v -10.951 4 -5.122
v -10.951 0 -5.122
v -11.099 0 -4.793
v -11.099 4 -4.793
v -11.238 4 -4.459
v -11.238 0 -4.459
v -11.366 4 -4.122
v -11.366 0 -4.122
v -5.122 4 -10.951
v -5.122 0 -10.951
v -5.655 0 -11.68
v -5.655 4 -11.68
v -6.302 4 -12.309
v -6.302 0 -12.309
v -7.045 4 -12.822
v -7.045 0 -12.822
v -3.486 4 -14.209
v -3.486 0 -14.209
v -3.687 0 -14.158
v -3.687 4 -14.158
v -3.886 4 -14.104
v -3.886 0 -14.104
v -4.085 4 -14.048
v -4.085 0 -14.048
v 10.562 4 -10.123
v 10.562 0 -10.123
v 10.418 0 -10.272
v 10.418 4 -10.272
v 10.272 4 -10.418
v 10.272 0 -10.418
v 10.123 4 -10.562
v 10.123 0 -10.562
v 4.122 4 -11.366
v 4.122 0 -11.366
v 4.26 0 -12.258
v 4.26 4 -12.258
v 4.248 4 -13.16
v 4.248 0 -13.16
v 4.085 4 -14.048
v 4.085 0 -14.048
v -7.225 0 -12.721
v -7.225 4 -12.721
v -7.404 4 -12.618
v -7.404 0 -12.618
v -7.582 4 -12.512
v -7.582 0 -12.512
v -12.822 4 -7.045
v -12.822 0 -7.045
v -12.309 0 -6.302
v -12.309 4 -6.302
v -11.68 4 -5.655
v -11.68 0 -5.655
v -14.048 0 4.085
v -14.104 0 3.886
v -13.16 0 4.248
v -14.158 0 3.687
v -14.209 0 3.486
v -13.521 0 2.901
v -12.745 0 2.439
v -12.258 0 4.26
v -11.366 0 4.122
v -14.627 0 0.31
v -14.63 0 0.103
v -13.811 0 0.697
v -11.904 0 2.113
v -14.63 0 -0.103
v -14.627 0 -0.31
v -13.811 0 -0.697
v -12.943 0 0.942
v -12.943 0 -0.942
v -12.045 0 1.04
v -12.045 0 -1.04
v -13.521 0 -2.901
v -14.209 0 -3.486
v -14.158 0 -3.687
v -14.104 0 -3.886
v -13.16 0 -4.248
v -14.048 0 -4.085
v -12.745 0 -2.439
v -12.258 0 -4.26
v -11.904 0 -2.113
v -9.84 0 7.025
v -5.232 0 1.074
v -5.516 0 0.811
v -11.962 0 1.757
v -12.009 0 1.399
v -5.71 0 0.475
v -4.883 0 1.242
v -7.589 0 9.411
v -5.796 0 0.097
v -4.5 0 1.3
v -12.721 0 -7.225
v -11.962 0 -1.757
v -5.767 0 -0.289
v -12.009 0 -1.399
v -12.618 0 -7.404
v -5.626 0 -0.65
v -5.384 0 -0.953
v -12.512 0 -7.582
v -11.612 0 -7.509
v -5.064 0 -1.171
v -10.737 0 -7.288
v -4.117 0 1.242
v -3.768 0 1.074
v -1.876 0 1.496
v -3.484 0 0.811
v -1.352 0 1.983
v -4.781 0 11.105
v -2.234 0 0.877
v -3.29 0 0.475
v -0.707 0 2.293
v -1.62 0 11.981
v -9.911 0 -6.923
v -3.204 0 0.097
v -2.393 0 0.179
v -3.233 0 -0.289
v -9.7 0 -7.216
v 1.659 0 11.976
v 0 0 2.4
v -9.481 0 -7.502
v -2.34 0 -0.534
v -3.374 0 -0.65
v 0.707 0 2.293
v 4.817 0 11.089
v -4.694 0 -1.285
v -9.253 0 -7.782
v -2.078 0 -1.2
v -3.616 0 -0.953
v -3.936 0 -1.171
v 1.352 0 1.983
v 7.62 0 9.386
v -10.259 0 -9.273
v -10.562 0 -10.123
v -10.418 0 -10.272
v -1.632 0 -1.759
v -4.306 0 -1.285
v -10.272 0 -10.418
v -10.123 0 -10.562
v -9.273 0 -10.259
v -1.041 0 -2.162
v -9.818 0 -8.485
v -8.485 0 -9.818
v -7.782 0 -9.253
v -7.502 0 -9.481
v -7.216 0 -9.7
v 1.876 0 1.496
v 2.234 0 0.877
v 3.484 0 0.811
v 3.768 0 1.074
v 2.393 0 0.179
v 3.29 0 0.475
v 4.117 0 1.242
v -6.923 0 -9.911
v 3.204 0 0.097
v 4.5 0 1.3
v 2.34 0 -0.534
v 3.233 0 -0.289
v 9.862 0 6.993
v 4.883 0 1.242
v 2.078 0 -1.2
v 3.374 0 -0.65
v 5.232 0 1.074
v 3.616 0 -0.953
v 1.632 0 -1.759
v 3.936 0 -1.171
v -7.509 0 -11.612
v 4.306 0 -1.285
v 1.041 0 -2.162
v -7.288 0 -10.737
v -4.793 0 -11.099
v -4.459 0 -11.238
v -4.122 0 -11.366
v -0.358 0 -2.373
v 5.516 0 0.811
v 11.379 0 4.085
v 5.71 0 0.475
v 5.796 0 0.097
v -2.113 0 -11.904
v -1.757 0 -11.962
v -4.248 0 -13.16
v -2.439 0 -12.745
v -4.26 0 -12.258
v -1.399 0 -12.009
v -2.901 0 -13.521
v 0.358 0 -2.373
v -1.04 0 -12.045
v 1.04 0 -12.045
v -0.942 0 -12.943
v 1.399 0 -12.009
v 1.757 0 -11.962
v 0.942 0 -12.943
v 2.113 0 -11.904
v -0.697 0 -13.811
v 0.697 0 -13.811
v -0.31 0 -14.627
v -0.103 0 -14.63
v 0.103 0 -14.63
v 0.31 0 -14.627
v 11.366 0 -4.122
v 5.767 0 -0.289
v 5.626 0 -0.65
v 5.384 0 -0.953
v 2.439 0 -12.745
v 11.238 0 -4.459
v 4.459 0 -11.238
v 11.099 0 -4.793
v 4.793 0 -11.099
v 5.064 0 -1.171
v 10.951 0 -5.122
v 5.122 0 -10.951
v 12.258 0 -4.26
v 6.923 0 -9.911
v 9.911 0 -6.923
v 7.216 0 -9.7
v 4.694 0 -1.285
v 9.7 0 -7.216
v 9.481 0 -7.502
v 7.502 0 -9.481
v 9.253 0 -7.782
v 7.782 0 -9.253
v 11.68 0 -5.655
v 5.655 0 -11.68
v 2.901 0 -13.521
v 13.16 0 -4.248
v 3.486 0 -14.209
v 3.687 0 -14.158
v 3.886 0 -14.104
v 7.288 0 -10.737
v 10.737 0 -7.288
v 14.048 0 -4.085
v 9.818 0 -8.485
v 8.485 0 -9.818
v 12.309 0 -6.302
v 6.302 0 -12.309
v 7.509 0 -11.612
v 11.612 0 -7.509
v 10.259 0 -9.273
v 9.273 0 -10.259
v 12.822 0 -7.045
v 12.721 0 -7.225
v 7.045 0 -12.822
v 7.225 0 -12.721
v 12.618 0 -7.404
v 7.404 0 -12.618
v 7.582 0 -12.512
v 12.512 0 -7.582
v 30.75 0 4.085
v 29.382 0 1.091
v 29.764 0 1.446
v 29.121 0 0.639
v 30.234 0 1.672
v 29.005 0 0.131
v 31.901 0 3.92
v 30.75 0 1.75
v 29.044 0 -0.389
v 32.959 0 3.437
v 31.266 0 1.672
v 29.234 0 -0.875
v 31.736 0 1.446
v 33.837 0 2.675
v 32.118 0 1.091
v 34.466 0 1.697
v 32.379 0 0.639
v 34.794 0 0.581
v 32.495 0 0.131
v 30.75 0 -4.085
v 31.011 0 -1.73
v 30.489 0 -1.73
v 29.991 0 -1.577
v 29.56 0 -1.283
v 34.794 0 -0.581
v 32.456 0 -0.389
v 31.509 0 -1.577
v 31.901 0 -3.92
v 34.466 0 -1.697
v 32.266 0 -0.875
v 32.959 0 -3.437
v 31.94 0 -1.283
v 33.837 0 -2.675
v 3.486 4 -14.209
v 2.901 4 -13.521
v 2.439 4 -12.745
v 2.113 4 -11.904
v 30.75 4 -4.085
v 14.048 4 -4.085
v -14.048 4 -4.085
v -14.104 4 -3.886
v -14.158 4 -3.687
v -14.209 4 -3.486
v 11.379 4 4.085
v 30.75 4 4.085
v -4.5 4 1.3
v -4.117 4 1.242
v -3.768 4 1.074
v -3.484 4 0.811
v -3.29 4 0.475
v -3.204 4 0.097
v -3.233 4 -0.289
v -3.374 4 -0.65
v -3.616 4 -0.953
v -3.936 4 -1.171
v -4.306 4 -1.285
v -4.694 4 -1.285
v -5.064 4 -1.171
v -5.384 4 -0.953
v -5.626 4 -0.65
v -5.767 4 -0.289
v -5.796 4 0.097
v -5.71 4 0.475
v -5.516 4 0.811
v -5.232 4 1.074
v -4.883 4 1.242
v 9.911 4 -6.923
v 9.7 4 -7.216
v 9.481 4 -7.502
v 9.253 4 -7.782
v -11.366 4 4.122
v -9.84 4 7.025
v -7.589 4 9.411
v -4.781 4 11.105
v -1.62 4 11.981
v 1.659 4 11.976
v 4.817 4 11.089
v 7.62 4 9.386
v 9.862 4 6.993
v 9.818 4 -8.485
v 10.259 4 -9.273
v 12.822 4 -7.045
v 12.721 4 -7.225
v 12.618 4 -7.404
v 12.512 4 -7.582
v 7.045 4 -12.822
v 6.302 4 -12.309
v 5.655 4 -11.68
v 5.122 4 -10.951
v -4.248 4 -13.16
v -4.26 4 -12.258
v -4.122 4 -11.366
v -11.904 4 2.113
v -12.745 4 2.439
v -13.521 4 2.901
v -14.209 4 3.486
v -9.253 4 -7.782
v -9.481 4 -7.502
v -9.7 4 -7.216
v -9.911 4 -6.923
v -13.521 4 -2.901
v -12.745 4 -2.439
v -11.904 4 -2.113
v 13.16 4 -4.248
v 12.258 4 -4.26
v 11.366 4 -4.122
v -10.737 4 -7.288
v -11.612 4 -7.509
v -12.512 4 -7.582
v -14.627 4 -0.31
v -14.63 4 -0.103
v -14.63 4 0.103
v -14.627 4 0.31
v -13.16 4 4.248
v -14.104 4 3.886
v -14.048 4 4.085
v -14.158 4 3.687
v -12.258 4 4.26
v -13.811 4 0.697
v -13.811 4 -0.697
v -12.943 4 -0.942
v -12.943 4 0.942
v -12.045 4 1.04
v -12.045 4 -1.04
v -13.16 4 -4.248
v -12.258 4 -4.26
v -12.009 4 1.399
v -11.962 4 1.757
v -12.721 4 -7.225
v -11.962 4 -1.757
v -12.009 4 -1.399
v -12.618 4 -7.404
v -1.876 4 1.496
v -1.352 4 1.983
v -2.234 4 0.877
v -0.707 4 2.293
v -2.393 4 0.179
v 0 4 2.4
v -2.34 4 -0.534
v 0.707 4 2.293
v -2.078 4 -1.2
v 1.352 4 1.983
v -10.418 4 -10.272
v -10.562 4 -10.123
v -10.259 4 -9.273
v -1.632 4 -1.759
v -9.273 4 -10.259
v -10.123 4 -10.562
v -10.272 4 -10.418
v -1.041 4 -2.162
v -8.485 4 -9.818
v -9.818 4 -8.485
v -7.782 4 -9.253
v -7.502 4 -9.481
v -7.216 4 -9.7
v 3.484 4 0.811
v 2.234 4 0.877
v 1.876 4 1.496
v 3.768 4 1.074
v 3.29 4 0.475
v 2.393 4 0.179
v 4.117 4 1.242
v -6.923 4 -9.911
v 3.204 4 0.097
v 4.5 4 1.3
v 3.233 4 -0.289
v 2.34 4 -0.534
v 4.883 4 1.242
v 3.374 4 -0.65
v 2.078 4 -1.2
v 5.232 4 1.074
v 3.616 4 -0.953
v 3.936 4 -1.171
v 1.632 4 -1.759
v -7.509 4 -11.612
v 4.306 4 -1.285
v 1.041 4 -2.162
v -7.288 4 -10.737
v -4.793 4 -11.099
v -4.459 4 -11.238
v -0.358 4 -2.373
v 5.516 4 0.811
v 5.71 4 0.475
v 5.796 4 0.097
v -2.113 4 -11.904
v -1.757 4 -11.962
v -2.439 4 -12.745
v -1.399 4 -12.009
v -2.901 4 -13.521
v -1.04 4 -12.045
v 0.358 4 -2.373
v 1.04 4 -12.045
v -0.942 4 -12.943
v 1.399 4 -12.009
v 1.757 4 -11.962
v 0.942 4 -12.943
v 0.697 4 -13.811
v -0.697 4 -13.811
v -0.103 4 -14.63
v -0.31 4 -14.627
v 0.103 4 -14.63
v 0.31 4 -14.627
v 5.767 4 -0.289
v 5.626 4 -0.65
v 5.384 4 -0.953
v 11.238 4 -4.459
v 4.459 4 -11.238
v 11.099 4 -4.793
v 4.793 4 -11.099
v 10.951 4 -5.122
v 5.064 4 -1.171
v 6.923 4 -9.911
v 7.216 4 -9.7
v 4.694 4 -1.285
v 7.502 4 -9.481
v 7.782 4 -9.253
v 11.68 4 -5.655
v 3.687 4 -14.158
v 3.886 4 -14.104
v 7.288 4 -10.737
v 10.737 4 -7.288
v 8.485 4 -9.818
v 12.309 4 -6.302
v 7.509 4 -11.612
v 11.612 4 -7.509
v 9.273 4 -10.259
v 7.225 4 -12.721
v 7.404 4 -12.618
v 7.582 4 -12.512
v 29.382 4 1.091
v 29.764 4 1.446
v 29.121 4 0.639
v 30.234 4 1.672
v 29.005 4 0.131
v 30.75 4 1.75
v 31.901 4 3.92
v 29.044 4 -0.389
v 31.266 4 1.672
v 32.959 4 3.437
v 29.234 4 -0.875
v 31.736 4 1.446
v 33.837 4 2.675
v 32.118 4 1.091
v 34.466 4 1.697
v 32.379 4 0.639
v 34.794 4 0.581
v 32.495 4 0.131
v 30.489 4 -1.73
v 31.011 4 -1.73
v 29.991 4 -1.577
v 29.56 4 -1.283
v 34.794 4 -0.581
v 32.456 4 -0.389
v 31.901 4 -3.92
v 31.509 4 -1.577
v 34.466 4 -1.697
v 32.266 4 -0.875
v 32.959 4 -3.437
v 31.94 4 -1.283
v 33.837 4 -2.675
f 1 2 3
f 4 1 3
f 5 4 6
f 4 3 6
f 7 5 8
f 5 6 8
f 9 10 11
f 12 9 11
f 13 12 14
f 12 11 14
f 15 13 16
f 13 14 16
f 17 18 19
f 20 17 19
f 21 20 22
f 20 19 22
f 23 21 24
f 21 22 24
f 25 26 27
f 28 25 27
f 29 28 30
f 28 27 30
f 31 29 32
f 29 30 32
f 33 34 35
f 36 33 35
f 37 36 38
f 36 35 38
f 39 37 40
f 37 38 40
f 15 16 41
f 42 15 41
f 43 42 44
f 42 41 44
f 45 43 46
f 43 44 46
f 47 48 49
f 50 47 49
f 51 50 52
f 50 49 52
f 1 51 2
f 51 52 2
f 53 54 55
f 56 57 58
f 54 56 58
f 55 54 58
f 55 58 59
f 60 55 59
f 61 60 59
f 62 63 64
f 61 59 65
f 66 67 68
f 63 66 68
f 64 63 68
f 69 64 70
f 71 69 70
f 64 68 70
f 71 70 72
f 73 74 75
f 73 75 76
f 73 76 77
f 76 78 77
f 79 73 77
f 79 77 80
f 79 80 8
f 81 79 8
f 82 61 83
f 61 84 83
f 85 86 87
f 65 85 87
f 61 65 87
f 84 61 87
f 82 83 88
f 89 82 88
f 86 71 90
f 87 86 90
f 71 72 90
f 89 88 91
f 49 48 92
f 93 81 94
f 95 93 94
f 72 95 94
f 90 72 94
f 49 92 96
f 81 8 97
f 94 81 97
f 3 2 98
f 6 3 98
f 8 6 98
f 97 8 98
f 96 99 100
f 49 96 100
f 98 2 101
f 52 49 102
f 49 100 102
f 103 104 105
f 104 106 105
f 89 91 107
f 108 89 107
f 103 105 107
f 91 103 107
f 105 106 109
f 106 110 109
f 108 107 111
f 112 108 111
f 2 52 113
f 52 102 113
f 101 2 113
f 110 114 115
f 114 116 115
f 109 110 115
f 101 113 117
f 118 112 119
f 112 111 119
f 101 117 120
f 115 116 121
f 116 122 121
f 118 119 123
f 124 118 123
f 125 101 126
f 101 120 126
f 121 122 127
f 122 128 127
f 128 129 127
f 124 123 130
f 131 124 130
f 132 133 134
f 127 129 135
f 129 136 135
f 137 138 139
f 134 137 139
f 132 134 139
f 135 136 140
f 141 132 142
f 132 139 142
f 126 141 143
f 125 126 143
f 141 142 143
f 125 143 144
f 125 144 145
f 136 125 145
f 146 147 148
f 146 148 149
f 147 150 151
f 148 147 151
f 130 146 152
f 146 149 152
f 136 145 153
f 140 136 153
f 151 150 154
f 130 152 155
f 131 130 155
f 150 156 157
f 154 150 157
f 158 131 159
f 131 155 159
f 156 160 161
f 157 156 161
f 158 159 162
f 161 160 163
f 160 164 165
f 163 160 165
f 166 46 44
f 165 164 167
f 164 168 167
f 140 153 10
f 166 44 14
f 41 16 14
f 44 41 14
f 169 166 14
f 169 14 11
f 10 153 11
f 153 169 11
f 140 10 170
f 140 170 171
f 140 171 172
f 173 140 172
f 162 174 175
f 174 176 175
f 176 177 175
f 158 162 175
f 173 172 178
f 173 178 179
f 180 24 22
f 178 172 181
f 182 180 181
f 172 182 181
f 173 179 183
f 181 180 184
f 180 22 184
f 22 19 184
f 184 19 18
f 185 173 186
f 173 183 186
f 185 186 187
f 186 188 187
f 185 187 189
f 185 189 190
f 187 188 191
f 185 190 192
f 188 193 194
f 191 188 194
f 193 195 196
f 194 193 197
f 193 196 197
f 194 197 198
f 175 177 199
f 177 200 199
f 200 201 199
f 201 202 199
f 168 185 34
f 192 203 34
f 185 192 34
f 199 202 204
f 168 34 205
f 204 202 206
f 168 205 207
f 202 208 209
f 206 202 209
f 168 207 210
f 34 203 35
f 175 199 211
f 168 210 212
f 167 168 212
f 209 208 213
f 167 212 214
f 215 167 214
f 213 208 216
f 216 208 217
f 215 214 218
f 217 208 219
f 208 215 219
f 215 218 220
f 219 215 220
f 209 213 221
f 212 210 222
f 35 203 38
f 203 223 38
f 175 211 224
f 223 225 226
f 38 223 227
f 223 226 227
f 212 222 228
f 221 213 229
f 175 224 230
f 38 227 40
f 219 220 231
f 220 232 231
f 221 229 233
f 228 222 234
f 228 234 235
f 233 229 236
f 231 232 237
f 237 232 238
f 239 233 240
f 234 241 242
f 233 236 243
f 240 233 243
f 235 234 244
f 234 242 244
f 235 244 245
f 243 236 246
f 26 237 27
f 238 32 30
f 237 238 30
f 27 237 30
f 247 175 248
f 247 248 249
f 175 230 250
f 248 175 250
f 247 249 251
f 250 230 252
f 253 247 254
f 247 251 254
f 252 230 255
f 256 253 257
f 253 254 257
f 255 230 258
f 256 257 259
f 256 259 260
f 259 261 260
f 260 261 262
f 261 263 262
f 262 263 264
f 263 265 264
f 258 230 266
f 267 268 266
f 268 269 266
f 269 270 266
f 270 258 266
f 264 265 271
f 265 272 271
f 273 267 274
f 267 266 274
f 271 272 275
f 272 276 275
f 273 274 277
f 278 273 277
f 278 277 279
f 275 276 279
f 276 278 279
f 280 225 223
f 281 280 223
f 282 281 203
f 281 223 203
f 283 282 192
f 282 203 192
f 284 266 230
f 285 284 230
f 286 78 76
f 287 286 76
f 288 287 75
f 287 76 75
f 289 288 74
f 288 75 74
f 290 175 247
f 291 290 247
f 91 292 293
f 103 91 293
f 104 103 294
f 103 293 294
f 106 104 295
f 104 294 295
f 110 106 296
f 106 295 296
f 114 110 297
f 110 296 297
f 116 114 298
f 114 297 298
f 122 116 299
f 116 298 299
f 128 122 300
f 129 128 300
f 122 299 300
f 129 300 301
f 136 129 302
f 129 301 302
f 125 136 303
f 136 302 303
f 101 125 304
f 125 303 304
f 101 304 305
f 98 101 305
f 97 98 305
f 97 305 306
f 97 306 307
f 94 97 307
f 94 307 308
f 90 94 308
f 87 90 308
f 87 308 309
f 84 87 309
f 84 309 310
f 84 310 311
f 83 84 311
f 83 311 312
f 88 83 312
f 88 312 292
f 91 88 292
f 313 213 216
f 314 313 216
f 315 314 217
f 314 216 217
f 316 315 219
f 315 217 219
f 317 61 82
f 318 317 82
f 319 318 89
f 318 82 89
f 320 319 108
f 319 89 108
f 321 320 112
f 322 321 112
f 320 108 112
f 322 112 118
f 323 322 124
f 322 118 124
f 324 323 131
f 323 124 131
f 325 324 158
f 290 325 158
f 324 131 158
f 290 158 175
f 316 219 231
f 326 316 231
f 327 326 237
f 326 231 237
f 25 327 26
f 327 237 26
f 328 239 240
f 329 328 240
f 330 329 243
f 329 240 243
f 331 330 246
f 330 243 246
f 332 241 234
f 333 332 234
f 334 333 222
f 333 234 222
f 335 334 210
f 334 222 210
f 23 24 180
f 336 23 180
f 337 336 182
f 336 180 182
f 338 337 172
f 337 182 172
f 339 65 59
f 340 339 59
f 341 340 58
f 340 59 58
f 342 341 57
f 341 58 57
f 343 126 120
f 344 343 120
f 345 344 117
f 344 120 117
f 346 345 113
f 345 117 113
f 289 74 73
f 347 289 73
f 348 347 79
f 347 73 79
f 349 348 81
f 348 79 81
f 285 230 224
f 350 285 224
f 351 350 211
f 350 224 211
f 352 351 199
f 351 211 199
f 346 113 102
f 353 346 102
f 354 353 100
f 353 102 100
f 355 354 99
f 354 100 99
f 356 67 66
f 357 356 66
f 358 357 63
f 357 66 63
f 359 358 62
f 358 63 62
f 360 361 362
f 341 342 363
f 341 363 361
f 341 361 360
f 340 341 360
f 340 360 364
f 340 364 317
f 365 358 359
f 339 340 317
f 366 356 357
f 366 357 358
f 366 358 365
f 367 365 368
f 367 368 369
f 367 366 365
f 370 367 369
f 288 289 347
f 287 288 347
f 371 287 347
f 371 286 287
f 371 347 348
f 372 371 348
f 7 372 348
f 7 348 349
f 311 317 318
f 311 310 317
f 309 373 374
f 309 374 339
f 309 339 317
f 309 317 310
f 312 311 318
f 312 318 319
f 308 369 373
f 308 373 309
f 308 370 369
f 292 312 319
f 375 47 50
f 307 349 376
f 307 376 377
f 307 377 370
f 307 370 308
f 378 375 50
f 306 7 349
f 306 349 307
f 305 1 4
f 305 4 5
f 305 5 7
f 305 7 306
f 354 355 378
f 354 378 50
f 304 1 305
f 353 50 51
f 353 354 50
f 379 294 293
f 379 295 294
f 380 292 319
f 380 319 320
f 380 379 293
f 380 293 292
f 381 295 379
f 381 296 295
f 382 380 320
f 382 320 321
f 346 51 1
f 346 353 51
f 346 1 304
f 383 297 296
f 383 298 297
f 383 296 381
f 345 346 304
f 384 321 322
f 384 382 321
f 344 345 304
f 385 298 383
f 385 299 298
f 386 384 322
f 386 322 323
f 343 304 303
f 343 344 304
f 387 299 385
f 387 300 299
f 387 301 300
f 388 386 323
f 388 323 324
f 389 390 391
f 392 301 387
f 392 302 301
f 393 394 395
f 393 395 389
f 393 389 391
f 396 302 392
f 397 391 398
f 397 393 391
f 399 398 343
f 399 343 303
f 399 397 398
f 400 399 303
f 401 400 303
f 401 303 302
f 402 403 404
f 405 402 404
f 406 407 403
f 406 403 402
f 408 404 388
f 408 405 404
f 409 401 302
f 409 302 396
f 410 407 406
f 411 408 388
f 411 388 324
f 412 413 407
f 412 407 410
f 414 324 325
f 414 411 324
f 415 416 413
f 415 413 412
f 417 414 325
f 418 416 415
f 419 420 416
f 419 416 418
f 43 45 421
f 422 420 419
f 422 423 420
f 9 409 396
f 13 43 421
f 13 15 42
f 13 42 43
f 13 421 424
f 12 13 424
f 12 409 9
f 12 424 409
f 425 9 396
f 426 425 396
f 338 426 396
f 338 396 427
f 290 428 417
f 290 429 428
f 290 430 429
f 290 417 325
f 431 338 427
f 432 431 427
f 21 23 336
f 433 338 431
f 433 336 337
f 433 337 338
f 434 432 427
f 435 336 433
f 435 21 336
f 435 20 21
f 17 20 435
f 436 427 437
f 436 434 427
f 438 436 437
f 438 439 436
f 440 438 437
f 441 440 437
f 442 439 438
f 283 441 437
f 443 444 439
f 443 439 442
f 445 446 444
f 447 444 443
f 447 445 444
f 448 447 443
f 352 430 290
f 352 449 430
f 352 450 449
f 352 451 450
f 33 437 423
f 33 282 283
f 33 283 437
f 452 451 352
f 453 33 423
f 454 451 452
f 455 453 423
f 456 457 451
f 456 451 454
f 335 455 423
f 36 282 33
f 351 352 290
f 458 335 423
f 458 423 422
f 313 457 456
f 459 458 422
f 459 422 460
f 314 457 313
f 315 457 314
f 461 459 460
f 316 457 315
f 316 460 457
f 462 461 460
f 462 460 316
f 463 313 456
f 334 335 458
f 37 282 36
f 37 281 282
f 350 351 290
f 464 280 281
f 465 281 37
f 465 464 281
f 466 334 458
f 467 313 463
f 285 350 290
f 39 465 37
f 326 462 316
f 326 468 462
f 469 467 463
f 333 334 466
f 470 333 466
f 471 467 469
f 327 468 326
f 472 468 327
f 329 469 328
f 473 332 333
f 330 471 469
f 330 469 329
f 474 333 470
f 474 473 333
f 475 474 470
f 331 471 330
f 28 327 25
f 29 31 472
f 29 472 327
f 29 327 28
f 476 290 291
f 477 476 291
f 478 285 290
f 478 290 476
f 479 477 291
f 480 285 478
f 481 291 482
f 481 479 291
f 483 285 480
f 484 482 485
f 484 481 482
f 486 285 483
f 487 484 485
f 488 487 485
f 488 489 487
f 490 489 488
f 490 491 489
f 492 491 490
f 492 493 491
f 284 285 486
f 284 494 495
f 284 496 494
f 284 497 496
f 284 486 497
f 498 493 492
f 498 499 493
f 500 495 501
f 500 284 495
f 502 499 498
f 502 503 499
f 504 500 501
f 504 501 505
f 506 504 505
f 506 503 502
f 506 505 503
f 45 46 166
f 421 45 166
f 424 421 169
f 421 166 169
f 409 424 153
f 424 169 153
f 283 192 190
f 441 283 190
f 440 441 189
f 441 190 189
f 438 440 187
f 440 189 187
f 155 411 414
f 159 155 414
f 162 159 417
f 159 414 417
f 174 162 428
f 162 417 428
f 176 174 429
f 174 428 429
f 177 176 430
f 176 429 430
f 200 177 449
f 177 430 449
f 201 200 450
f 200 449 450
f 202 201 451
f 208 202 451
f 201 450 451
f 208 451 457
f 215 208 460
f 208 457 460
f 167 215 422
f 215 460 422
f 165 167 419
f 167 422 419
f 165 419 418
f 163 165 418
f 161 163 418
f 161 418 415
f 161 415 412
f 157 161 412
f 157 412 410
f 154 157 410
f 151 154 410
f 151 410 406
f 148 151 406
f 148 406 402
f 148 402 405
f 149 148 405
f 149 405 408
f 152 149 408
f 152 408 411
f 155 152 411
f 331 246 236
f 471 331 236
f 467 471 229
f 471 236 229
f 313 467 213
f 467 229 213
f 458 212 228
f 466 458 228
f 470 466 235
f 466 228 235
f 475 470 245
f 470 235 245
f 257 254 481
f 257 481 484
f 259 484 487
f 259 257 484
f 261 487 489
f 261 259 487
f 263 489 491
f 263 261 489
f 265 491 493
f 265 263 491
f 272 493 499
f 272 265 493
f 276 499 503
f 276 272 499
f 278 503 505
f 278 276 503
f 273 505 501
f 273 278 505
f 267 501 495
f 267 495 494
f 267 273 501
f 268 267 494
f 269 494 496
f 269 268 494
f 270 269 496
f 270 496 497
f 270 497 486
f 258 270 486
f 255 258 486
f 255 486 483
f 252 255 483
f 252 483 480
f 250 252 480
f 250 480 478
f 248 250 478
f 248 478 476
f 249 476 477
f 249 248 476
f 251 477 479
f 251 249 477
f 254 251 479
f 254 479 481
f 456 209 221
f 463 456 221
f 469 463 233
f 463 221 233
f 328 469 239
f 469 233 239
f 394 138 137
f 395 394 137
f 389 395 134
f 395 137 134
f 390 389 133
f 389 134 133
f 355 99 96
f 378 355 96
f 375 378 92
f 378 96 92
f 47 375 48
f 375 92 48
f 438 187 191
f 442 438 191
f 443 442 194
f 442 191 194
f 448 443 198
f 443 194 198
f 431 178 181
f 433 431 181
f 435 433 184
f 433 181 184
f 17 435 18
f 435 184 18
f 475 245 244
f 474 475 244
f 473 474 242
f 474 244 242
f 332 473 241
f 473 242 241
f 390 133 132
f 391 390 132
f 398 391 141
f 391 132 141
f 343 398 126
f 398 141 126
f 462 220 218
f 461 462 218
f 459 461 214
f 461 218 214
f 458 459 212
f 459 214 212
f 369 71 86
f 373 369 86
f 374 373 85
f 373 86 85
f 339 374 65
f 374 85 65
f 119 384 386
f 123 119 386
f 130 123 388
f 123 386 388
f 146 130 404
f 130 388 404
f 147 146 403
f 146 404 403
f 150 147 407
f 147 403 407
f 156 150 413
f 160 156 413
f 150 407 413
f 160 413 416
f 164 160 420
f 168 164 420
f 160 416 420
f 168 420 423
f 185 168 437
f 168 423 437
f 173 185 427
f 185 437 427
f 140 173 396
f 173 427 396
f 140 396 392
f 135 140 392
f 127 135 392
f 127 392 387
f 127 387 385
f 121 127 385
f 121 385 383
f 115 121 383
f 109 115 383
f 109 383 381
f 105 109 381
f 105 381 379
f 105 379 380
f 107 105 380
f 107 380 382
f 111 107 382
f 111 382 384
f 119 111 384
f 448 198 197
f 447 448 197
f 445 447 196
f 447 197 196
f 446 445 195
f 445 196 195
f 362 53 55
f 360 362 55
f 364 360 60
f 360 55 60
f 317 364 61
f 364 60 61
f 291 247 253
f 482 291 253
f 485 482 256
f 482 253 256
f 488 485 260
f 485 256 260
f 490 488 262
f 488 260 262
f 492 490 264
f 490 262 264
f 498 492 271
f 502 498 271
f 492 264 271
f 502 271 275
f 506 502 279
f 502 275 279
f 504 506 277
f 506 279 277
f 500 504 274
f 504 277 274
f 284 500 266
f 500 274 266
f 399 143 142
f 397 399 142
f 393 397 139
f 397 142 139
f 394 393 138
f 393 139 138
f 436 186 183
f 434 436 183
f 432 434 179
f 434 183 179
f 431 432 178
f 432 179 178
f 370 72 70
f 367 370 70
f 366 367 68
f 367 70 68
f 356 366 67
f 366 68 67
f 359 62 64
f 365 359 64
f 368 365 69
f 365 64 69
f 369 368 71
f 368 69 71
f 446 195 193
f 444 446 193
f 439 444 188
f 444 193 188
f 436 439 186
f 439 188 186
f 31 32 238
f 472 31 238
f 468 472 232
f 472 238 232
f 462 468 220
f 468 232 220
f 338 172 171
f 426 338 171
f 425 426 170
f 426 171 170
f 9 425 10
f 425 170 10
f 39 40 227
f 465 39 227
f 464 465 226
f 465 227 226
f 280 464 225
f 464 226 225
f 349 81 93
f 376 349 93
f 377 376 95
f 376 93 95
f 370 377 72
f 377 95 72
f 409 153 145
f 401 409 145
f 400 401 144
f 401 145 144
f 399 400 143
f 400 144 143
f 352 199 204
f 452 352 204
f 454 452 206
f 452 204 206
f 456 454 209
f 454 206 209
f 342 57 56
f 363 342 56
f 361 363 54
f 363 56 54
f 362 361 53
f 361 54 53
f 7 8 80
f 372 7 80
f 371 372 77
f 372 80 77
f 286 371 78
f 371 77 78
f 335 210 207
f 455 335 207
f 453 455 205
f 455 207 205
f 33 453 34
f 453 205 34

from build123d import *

# Parameters (mm, degrees)
SKETCH_2_R          = 1.75
EXTRUDE_1_DEPTH     = 4
SKETCH_3_R          = 2.4
SKETCH_3_R_2        = 1.3
CUT_EXTRUDE_1_DEPTH = 38.993706757


with BuildPart() as part:
    # 草图2 → 凸台-拉伸1 (new body)
    with BuildSketch(Plane(origin=(0, 0, 0), x_dir=(1, 0, 0), z_dir=(0, 1, 0))):
        with BuildLine():
            ThreePointArc((30.75, -4.085109489), (34.835109489, 0), (30.75, 4.085109489))
            Line((30.75, 4.085109489), (14.048088143, 4.085109489))
            ThreePointArc((14.048088143, 4.085109489), (12.709169027, 4.272836063), (11.365584201, 4.122086336))
            ThreePointArc((11.365584201, 4.122086336), (11.169703548, 4.626642697), (10.951436862, 5.12192646))
            ThreePointArc((10.951436862, 5.12192646), (12.008090957, 5.965388247), (12.82210701, 7.044889767))
            ThreePointArc((12.82210701, 7.044889767), (12.669951657, 7.315), (12.51210701, 7.581825517))
            ThreePointArc((12.51210701, 7.581825517), (11.170223244, 7.416617696), (9.911436862, 6.9232593))
            ThreePointArc((9.911436862, 6.9232593), (9.591641884, 7.359925677), (9.252623584, 7.781841479))
            ThreePointArc((9.252623584, 7.781841479), (10.05496909, 8.870045207), (10.561852666, 10.123446462))
            ThreePointArc((10.561852666, 10.123446462), (10.344972209, 10.344972209), (10.123446462, 10.561852666))
            ThreePointArc((10.123446462, 10.561852666), (8.870045207, 10.05496909), (7.781841479, 9.252623584))
            ThreePointArc((7.781841479, 9.252623584), (7.359925677, 9.591641884), (6.9232593, 9.911436862))
            ThreePointArc((6.9232593, 9.911436862), (7.416617696, 11.170223244), (7.581825517, 12.51210701))
            ThreePointArc((7.581825517, 12.51210701), (7.315, 12.669951657), (7.044889767, 12.82210701))
            ThreePointArc((7.044889767, 12.82210701), (5.965388247, 12.008090957), (5.12192646, 10.951436862))
            ThreePointArc((5.12192646, 10.951436862), (4.626642697, 11.169703548), (4.122086336, 11.365584201))
            ThreePointArc((4.122086336, 11.365584201), (4.272836063, 12.709169027), (4.085109489, 14.048088143))
            ThreePointArc((4.085109489, 14.048088143), (3.78652263, 14.131494839), (3.486235477, 14.208555951))
            ThreePointArc((3.486235477, 14.208555951), (2.654199937, 13.14288127), (2.112960617, 11.903927815))
            ThreePointArc((2.112960617, 11.903927815), (1.578061664, 11.986568374), (1.04, 12.04518576))
            ThreePointArc((1.04, 12.04518576), (0.837867713, 13.382005944), (0.31, 14.626715284))
            ThreePointArc((0.31, 14.626715284), (0, 14.63), (-0.31, 14.626715284))
            ThreePointArc((-0.31, 14.626715284), (-0.837867713, 13.382005944), (-1.04, 12.04518576))
            ThreePointArc((-1.04, 12.04518576), (-1.578061664, 11.986568374), (-2.112960617, 11.903927815))
            ThreePointArc((-2.112960617, 11.903927815), (-2.654199937, 13.14288127), (-3.486235477, 14.208555951))
            ThreePointArc((-3.486235477, 14.208555951), (-3.78652263, 14.131494839), (-4.085109489, 14.048088143))
            ThreePointArc((-4.085109489, 14.048088143), (-4.272836063, 12.709169027), (-4.122086336, 11.365584201))
            ThreePointArc((-4.122086336, 11.365584201), (-4.626642697, 11.169703548), (-5.12192646, 10.951436862))
            ThreePointArc((-5.12192646, 10.951436862), (-5.965388247, 12.008090957), (-7.044889767, 12.82210701))
            ThreePointArc((-7.044889767, 12.82210701), (-7.315, 12.669951657), (-7.581825517, 12.51210701))
            ThreePointArc((-7.581825517, 12.51210701), (-7.416617696, 11.170223244), (-6.9232593, 9.911436862))
            ThreePointArc((-6.9232593, 9.911436862), (-7.359925677, 9.591641884), (-7.781841479, 9.252623584))
            ThreePointArc((-7.781841479, 9.252623584), (-8.870045207, 10.05496909), (-10.123446462, 10.561852666))
            ThreePointArc((-10.123446462, 10.561852666), (-10.344972209, 10.344972209), (-10.561852666, 10.123446462))
            ThreePointArc((-10.561852666, 10.123446462), (-10.05496909, 8.870045207), (-9.252623584, 7.781841479))
            ThreePointArc((-9.252623584, 7.781841479), (-9.591641884, 7.359925677), (-9.911436862, 6.9232593))
            ThreePointArc((-9.911436862, 6.9232593), (-11.170223244, 7.416617696), (-12.51210701, 7.581825517))
            ThreePointArc((-12.51210701, 7.581825517), (-12.669951657, 7.315), (-12.82210701, 7.044889767))
            ThreePointArc((-12.82210701, 7.044889767), (-12.008090957, 5.965388247), (-10.951436862, 5.12192646))
            ThreePointArc((-10.951436862, 5.12192646), (-11.169703548, 4.626642697), (-11.365584201, 4.122086336))
            ThreePointArc((-11.365584201, 4.122086336), (-12.709169027, 4.272836063), (-14.048088143, 4.085109489))
            ThreePointArc((-14.048088143, 4.085109489), (-14.131494839, 3.78652263), (-14.208555951, 3.486235477))
            ThreePointArc((-14.208555951, 3.486235477), (-13.14288127, 2.654199937), (-11.903927815, 2.112960617))
            ThreePointArc((-11.903927815, 2.112960617), (-11.986568374, 1.578061664), (-12.04518576, 1.04))
            ThreePointArc((-12.04518576, 1.04), (-13.382005944, 0.837867713), (-14.626715284, 0.31))
            ThreePointArc((-14.626715284, 0.31), (-14.63, 0), (-14.626715284, -0.31))
            ThreePointArc((-14.626715284, -0.31), (-13.382005944, -0.837867713), (-12.04518576, -1.04))
            ThreePointArc((-12.04518576, -1.04), (-11.986568374, -1.578061664), (-11.903927815, -2.112960617))
            ThreePointArc((-11.903927815, -2.112960617), (-13.14288127, -2.654199937), (-14.208555951, -3.486235477))
            ThreePointArc((-14.208555951, -3.486235477), (-14.131494839, -3.78652263), (-14.048088143, -4.085109489))
            ThreePointArc((-14.048088143, -4.085109489), (-12.709169027, -4.272836063), (-11.365584201, -4.122086336))
            ThreePointArc((-11.365584201, -4.122086336), (0.019655269, -12.089984023), (11.378927035, -4.085109489))
            Line((11.378927035, -4.085109489), (30.75, -4.085109489))
        make_face()
        with Locations(Location((0, 0, 0), (0, 0, 270))):
            Circle(SKETCH_2_R, mode=Mode.SUBTRACT)
        with Locations(Location((30.75, 0, 0), (0, 0, 270))):
            Circle(SKETCH_2_R, mode=Mode.SUBTRACT)
    extrude(amount=EXTRUDE_1_DEPTH)

    # 草图3 → 切除-拉伸1 (cut, through all)
    with BuildSketch(Plane(origin=(0, 4, 0), x_dir=(1, 0, 0), z_dir=(0, 1, 0))):
        with Locations(Location((0, 0, 0), (0, 0, 270))):
            Circle(SKETCH_3_R)
        with Locations(Location((4.5, 0, 0), (0, 0, 270))):
            Circle(SKETCH_3_R_2)
        with Locations(Location((-4.5, 0, 0), (0, 0, 270))):
            Circle(SKETCH_3_R_2)
    extrude(amount=-CUT_EXTRUDE_1_DEPTH, mode=Mode.SUBTRACT)


solid = part.part
